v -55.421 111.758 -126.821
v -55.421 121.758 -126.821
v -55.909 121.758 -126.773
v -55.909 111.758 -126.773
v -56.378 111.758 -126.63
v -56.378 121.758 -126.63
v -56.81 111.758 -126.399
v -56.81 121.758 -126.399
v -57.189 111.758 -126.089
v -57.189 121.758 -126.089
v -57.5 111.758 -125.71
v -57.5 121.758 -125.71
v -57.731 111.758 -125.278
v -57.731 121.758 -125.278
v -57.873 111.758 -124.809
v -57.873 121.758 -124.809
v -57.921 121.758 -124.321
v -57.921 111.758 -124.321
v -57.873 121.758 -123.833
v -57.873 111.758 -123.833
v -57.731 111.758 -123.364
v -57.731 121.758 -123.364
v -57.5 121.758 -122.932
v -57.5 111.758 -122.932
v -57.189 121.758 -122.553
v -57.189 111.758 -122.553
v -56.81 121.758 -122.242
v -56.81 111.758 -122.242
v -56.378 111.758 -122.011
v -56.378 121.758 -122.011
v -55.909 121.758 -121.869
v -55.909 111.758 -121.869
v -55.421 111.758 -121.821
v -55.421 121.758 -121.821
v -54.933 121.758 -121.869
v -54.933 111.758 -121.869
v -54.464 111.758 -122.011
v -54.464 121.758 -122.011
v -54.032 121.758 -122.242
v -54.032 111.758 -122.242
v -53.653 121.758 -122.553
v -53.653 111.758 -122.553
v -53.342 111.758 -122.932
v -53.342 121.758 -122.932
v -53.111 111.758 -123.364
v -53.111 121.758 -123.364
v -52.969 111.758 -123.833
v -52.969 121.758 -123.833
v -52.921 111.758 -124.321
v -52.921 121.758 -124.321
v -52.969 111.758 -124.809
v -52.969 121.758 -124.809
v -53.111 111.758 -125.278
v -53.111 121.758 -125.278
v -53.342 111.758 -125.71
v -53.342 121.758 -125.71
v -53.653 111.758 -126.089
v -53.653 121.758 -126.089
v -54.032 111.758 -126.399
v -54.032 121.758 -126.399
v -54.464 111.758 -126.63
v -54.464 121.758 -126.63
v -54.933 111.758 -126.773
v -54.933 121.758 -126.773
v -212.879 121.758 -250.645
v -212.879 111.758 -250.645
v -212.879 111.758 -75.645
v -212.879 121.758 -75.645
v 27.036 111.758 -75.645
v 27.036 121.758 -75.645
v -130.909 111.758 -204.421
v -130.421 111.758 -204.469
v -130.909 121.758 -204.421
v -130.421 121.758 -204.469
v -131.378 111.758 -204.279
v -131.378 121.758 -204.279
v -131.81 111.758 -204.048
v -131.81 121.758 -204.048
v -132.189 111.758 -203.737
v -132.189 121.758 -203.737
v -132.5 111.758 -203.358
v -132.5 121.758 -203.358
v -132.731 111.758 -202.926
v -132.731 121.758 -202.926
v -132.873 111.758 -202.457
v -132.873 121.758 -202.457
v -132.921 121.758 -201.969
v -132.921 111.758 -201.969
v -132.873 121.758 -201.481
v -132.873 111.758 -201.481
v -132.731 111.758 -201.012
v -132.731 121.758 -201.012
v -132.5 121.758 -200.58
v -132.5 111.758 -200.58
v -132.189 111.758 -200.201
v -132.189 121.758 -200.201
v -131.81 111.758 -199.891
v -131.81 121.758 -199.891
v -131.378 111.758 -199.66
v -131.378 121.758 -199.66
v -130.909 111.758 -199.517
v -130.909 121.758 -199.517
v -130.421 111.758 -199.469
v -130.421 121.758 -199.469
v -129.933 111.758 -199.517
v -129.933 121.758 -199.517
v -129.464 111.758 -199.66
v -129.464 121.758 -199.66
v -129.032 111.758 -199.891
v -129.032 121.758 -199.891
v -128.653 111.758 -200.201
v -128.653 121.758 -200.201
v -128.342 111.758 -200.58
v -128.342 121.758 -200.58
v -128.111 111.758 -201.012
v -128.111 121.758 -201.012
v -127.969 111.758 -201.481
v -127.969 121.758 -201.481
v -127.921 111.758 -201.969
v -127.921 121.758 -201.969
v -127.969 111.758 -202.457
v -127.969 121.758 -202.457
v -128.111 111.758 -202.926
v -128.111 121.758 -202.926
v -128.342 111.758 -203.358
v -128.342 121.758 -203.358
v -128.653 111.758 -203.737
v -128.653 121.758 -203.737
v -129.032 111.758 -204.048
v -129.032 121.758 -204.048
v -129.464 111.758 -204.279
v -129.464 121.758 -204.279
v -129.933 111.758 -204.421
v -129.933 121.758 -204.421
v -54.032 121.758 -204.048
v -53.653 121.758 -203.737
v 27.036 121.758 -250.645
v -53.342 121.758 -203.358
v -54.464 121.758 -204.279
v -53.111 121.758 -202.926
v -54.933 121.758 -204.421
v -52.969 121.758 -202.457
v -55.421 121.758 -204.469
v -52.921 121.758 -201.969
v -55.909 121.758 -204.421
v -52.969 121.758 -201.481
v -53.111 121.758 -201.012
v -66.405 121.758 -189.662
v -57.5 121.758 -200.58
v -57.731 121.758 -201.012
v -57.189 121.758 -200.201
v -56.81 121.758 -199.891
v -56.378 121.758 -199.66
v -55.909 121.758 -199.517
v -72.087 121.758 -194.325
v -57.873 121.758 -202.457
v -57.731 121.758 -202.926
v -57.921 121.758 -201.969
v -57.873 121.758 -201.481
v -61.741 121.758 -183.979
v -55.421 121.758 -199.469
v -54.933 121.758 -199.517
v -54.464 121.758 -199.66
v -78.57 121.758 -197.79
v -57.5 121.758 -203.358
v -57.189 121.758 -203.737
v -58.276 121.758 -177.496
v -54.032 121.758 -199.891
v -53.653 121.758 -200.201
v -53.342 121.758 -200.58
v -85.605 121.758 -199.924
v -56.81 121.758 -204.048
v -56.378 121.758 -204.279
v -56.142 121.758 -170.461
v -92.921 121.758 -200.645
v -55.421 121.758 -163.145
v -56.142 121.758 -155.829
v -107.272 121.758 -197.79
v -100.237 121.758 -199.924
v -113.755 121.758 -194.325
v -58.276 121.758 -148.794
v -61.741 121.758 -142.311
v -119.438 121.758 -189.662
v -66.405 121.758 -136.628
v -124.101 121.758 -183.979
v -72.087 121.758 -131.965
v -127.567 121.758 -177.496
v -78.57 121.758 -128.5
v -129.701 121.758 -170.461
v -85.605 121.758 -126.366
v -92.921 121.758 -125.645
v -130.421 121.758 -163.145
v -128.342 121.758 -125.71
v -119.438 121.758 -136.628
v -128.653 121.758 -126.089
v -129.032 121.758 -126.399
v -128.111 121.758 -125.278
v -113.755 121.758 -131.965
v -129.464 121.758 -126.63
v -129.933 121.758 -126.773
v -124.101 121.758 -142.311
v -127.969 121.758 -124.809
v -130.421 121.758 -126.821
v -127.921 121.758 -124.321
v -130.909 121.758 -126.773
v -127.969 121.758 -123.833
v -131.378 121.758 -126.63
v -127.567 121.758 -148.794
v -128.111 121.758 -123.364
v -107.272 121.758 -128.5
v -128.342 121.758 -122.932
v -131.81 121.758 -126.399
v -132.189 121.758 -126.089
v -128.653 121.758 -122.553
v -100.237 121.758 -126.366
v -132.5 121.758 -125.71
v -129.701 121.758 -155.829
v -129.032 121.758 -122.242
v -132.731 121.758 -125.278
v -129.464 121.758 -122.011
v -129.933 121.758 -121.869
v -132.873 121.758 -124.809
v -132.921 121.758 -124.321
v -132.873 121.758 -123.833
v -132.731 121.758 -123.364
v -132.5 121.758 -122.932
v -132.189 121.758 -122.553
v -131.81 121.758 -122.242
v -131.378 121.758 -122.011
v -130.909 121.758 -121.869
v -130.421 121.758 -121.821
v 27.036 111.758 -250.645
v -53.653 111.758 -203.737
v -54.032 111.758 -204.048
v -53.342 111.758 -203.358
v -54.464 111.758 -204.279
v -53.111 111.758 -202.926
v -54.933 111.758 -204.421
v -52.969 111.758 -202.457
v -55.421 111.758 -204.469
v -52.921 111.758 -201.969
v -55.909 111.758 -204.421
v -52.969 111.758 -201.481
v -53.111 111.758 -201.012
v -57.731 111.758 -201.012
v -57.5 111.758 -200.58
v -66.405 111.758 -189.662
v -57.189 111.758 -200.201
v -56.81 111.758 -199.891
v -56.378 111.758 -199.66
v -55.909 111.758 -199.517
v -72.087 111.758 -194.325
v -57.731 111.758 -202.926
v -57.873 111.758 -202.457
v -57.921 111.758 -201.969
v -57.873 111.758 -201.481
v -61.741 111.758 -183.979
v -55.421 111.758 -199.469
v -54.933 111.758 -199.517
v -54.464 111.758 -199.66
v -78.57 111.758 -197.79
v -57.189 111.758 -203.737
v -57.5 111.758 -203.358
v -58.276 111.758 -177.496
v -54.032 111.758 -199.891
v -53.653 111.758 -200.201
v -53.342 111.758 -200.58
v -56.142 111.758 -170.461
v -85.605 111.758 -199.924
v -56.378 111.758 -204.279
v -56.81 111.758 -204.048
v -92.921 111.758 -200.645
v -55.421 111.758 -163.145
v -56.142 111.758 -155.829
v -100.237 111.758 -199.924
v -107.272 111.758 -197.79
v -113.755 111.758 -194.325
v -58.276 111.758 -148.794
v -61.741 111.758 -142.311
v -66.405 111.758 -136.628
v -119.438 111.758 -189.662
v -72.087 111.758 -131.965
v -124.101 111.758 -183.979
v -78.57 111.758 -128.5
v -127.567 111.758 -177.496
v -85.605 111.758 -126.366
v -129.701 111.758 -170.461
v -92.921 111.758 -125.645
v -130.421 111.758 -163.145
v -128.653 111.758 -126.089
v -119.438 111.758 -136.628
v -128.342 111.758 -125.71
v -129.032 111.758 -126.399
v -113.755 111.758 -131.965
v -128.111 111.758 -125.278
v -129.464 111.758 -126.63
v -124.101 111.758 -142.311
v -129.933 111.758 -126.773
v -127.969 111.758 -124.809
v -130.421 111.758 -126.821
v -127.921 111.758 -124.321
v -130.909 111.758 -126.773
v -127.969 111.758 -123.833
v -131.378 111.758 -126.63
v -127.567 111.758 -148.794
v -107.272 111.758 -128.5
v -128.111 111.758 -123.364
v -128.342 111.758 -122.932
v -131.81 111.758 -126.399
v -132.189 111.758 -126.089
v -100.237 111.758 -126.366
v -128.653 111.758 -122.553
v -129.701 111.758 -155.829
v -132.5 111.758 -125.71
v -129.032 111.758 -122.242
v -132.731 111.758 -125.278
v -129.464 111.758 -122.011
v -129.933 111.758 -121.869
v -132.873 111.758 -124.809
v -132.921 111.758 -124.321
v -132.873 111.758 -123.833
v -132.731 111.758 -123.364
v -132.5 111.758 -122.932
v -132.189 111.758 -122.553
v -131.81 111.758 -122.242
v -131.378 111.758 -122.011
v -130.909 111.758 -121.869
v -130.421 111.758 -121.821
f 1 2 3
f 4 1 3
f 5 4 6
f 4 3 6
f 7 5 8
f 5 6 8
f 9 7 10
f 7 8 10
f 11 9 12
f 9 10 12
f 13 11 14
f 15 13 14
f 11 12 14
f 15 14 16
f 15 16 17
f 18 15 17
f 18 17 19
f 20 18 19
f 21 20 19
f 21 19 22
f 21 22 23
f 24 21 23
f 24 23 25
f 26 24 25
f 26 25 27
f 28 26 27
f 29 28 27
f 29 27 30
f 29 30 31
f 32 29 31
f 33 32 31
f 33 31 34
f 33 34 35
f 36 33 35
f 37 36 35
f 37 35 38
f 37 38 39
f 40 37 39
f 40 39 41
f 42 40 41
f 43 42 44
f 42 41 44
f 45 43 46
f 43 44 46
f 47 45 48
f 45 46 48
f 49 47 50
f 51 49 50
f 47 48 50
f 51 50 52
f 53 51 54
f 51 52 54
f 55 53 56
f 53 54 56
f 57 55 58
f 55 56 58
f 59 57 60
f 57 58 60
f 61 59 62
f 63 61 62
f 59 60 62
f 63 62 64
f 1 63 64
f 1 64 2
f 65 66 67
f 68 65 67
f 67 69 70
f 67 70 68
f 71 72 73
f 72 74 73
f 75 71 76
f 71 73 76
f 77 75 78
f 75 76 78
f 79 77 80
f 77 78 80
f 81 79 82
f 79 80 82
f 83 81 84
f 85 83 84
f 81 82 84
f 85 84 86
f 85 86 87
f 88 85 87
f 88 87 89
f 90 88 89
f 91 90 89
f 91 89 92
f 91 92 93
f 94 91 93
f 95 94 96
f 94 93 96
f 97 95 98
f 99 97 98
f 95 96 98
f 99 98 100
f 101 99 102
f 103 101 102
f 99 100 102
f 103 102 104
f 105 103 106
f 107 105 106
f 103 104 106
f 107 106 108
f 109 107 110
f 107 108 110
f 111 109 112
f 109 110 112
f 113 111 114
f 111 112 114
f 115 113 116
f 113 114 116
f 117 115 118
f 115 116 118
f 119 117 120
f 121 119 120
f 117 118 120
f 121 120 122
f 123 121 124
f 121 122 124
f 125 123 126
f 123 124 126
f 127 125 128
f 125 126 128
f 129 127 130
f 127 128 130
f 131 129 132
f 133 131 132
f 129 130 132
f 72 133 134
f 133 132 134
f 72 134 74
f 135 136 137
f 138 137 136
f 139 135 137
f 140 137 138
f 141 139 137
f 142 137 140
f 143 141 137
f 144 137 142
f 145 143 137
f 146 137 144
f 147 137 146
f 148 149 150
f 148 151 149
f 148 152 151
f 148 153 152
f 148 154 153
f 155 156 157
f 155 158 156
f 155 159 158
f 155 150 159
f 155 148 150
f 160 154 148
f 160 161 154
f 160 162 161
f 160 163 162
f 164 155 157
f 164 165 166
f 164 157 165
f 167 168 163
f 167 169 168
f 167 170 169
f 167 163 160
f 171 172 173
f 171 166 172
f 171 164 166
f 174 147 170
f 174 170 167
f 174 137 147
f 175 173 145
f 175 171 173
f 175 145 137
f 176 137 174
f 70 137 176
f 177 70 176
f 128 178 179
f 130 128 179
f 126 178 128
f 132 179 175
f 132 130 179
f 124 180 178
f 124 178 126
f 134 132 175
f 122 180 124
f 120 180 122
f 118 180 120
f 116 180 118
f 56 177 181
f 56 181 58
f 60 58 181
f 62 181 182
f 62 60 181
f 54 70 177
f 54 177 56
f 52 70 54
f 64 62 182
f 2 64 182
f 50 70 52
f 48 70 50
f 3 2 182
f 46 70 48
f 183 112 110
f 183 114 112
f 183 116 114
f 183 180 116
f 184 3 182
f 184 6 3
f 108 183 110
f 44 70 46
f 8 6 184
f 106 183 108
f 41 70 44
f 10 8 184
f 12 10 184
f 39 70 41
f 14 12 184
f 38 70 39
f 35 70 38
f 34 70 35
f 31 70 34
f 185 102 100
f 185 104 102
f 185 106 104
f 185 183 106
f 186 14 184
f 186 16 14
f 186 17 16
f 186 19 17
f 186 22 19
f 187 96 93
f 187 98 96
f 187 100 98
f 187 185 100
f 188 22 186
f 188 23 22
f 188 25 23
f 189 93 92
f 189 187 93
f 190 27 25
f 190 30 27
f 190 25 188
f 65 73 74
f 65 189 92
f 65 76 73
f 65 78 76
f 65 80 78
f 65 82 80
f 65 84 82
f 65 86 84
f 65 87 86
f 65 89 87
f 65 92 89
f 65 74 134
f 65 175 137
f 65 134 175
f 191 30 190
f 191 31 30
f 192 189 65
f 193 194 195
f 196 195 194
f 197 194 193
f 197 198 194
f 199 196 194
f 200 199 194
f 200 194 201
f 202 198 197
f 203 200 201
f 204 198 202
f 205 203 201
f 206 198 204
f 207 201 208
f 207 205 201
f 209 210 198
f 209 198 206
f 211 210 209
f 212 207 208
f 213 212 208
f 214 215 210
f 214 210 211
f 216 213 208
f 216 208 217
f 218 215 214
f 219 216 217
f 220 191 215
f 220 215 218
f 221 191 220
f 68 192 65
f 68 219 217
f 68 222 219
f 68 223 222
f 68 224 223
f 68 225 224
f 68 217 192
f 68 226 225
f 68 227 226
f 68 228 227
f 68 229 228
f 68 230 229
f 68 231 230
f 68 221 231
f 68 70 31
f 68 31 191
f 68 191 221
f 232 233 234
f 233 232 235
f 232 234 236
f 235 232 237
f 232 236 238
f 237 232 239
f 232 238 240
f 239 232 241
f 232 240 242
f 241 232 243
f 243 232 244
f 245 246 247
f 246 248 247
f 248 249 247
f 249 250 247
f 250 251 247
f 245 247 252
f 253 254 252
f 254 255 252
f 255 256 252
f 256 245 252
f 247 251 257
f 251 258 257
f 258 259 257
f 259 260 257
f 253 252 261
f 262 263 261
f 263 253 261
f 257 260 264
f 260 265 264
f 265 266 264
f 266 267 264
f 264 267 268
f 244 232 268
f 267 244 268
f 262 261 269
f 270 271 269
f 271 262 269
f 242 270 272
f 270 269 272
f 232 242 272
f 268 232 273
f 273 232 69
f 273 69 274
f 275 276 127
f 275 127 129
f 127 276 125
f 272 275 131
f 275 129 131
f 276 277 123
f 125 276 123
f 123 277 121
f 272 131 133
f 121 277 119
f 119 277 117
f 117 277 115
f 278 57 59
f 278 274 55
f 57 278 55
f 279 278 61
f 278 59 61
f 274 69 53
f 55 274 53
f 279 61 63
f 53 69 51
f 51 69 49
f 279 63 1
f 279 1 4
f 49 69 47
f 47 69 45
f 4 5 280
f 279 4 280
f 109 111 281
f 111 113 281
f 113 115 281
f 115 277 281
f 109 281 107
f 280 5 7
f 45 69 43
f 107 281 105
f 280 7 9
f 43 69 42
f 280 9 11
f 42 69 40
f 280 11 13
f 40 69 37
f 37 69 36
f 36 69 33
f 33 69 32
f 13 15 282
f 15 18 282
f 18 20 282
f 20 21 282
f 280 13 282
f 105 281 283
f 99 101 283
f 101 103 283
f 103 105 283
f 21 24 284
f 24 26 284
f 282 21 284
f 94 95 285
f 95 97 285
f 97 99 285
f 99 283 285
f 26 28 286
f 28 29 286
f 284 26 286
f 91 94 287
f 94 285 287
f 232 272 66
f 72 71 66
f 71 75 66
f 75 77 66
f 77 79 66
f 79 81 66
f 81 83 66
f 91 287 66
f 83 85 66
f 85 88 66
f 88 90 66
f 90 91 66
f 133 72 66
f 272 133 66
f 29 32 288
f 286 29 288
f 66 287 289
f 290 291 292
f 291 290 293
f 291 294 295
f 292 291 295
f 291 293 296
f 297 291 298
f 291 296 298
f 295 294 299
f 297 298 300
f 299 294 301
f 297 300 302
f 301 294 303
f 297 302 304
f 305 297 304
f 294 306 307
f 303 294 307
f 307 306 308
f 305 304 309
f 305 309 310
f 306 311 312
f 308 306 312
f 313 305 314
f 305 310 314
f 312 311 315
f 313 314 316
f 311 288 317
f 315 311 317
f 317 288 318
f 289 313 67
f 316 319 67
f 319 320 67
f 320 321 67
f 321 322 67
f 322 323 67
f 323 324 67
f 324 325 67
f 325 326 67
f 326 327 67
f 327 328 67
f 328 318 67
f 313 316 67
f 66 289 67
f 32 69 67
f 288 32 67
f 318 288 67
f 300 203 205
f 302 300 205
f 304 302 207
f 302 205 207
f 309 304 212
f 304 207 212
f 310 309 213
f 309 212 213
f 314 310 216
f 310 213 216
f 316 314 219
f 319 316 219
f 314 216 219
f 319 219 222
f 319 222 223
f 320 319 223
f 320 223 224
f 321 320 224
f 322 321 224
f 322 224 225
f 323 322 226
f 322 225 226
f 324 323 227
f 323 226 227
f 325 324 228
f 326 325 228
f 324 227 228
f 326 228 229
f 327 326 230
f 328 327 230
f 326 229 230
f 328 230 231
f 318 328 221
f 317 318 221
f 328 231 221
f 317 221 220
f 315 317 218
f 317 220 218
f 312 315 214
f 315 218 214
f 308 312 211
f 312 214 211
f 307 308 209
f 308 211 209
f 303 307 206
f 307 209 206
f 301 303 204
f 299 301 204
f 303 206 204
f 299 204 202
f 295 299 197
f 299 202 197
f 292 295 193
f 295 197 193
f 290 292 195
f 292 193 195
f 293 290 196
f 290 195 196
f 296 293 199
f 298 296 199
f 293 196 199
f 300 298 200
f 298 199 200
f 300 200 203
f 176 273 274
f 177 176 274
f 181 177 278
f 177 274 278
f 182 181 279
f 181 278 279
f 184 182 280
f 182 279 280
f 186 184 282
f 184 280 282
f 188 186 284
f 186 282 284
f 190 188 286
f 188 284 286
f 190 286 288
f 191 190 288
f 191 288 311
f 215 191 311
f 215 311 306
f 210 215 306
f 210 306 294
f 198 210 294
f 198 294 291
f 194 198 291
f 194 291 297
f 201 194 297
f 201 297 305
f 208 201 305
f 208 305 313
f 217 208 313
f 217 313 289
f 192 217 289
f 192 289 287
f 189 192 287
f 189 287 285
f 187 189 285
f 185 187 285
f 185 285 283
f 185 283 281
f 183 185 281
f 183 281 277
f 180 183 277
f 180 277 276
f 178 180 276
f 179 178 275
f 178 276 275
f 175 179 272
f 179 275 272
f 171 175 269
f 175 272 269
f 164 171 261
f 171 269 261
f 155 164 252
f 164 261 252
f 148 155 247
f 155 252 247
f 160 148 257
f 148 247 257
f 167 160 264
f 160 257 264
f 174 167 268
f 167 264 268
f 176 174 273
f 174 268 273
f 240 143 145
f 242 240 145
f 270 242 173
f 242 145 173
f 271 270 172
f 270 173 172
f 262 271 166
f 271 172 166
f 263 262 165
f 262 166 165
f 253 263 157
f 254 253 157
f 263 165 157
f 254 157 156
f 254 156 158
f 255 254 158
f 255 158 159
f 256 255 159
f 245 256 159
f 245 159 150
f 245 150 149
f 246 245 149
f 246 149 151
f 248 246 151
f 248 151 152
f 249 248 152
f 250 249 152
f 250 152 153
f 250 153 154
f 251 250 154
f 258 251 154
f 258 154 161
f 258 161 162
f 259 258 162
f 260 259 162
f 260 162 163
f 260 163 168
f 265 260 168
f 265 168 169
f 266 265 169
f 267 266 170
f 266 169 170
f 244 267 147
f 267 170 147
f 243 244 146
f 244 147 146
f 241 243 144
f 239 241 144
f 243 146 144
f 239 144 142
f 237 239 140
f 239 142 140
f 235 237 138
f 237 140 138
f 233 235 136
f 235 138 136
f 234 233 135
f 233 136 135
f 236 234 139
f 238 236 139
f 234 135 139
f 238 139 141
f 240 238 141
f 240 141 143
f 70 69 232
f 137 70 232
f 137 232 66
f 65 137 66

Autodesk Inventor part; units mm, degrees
ref_plane "YZ Plane" through (0, 0, 0) normal (1, 0, 0) x (0, 1, 0)
ref_plane "XZ Plane" through (0, 0, 0) normal (0, 1, 0) x (-1, 0, 0)
ref_plane "XY Plane" through (0, 0, 0) normal (0, 0, 1) x (1, 0, 0)
ref_plane "Work Plane2" through (-92.9211, 111.7581, -85.645) normal (0, 1, 0) x (-1, 0, 0)
sketch "Sketch2" plane through (-92.9211, 111.7581, -85.645) normal (0, 1, 0) x (-1, 0, 0)
  line L0 (63, 0) -> (-63, 0)
  line L1 (-63, 0) -> (-63, -150)
  line L2 (-63, -150) -> (63, -150)
  line L3 (63, -150) -> (63, 0)
  line L4 (63, 0) -> (-63, -150) construction
  line L5 (-63, 0) -> (63, -150) construction
  line L6 (-114.9576, 160) -> (114.9576, 160)
  line L7 (114.9576, 160) -> (114.9576, -160)
  line L8 (114.9576, -160) -> (-114.9576, -160)
  line L9 (-114.9576, -160) -> (-114.9576, 160)
  line L10 (119.9576, -165) -> (119.9576, 165)
  line L11 (119.9576, 165) -> (-119.9576, 165)
  line L12 (-119.9576, 165) -> (-119.9576, 10)
  line L13 (-119.9576, -165) -> (119.9576, -165)
  line L14 (-119.9576, 10) -> (-114.9576, 10)
  line L15 (-114.9576, 10) -> (114.9576, 10)
  line L16 (114.9576, 10) -> (119.9576, 10)
  line L17 (-119.9576, 10) -> (-119.9576, -165)
  point P0 (-92.9211, 85.645)
  point P1 (0, -75)
  point P2 (114.9576, 160)
  dimension "d0" = 126
  dimension "d1" = 150
  dimension "d2" = 5
  dimension "d5" = 10
  dimension "d6" = 10
extrude "Extrusion1" add sketch "Sketch2" along normal blind 10 contours L3 L2 L1 L0 | L15 L7 L8 L9 | L9 L8 L7 L16 L10 L13 L17 L14
sketch "Sketch3" plane through (-92.9211, 111.7581, -85.645) normal (0, -1, 0) x (1, 0, 0)
  line L0 (-119.9576, 10) -> (119.9576, 10) projected
  line L1 (-119.9576, -165) -> (-119.9576, 10) projected
  line L2 (119.9576, -165) -> (-119.9576, -165) projected
  line L3 (119.9576, 10) -> (119.9576, -165) projected
  line L4 (-119.9576, -165) -> (119.9576, 10)
  line L5 (-119.9576, 10) -> (119.9576, -165)
  circle A0 centre (0, -77.5) radius 37.5
  point P0 (92.9211, 85.645)
  dimension "d7" = 75
extrude "Extrusion2" cut sketch "Sketch3" against normal through all contours A0 L4 L5 | L5 L4 A0 | A0 L5 L4 | L4 L5 A0
sketch "Sketch4" plane through (-92.9211, 111.7581, -85.645) normal (0, -1, 0) x (1, 0, 0)
  circle A0 centre (-37.5, -38.6758) radius 2.5 projected
  circle A1 centre (37.5, -38.6758) radius 2.5 projected
  circle A2 centre (37.5, -116.3242) radius 2.5 projected
  circle A3 centre (-37.5, -116.3242) radius 2.5 projected
  arc A4 (47.5, -35) -> (42.5, -30) centre (42.5, -35) ccw projected
  line L0 (42.5, -30) -> (-42.5, -30) projected
  arc A5 (-42.5, -30) -> (-47.5, -35) centre (-42.5, -35) ccw projected
  line L1 (-47.5, -35) -> (-47.5, -120) projected
  arc A6 (-47.5, -120) -> (-42.5, -125) centre (-42.5, -120) ccw projected
  line L2 (-42.5, -125) -> (42.5, -125) projected
  arc A7 (42.5, -125) -> (47.5, -120) centre (42.5, -120) ccw projected
  line L3 (47.5, -120) -> (47.5, -35) projected
  circle A8 centre (0, -77.5) radius 5 projected
  point P0 (92.9211, 85.645)
hole "Hole1" at (-130.4211, 111.7581, -124.3208) at (-55.4211, 111.7581, -124.3208) at (-55.4211, 111.7581, -201.9692) at (-130.4211, 111.7581, -201.9692) direction (0, 1, 0) diameter 5 end through all
properties part number "Sleed_Plate"
